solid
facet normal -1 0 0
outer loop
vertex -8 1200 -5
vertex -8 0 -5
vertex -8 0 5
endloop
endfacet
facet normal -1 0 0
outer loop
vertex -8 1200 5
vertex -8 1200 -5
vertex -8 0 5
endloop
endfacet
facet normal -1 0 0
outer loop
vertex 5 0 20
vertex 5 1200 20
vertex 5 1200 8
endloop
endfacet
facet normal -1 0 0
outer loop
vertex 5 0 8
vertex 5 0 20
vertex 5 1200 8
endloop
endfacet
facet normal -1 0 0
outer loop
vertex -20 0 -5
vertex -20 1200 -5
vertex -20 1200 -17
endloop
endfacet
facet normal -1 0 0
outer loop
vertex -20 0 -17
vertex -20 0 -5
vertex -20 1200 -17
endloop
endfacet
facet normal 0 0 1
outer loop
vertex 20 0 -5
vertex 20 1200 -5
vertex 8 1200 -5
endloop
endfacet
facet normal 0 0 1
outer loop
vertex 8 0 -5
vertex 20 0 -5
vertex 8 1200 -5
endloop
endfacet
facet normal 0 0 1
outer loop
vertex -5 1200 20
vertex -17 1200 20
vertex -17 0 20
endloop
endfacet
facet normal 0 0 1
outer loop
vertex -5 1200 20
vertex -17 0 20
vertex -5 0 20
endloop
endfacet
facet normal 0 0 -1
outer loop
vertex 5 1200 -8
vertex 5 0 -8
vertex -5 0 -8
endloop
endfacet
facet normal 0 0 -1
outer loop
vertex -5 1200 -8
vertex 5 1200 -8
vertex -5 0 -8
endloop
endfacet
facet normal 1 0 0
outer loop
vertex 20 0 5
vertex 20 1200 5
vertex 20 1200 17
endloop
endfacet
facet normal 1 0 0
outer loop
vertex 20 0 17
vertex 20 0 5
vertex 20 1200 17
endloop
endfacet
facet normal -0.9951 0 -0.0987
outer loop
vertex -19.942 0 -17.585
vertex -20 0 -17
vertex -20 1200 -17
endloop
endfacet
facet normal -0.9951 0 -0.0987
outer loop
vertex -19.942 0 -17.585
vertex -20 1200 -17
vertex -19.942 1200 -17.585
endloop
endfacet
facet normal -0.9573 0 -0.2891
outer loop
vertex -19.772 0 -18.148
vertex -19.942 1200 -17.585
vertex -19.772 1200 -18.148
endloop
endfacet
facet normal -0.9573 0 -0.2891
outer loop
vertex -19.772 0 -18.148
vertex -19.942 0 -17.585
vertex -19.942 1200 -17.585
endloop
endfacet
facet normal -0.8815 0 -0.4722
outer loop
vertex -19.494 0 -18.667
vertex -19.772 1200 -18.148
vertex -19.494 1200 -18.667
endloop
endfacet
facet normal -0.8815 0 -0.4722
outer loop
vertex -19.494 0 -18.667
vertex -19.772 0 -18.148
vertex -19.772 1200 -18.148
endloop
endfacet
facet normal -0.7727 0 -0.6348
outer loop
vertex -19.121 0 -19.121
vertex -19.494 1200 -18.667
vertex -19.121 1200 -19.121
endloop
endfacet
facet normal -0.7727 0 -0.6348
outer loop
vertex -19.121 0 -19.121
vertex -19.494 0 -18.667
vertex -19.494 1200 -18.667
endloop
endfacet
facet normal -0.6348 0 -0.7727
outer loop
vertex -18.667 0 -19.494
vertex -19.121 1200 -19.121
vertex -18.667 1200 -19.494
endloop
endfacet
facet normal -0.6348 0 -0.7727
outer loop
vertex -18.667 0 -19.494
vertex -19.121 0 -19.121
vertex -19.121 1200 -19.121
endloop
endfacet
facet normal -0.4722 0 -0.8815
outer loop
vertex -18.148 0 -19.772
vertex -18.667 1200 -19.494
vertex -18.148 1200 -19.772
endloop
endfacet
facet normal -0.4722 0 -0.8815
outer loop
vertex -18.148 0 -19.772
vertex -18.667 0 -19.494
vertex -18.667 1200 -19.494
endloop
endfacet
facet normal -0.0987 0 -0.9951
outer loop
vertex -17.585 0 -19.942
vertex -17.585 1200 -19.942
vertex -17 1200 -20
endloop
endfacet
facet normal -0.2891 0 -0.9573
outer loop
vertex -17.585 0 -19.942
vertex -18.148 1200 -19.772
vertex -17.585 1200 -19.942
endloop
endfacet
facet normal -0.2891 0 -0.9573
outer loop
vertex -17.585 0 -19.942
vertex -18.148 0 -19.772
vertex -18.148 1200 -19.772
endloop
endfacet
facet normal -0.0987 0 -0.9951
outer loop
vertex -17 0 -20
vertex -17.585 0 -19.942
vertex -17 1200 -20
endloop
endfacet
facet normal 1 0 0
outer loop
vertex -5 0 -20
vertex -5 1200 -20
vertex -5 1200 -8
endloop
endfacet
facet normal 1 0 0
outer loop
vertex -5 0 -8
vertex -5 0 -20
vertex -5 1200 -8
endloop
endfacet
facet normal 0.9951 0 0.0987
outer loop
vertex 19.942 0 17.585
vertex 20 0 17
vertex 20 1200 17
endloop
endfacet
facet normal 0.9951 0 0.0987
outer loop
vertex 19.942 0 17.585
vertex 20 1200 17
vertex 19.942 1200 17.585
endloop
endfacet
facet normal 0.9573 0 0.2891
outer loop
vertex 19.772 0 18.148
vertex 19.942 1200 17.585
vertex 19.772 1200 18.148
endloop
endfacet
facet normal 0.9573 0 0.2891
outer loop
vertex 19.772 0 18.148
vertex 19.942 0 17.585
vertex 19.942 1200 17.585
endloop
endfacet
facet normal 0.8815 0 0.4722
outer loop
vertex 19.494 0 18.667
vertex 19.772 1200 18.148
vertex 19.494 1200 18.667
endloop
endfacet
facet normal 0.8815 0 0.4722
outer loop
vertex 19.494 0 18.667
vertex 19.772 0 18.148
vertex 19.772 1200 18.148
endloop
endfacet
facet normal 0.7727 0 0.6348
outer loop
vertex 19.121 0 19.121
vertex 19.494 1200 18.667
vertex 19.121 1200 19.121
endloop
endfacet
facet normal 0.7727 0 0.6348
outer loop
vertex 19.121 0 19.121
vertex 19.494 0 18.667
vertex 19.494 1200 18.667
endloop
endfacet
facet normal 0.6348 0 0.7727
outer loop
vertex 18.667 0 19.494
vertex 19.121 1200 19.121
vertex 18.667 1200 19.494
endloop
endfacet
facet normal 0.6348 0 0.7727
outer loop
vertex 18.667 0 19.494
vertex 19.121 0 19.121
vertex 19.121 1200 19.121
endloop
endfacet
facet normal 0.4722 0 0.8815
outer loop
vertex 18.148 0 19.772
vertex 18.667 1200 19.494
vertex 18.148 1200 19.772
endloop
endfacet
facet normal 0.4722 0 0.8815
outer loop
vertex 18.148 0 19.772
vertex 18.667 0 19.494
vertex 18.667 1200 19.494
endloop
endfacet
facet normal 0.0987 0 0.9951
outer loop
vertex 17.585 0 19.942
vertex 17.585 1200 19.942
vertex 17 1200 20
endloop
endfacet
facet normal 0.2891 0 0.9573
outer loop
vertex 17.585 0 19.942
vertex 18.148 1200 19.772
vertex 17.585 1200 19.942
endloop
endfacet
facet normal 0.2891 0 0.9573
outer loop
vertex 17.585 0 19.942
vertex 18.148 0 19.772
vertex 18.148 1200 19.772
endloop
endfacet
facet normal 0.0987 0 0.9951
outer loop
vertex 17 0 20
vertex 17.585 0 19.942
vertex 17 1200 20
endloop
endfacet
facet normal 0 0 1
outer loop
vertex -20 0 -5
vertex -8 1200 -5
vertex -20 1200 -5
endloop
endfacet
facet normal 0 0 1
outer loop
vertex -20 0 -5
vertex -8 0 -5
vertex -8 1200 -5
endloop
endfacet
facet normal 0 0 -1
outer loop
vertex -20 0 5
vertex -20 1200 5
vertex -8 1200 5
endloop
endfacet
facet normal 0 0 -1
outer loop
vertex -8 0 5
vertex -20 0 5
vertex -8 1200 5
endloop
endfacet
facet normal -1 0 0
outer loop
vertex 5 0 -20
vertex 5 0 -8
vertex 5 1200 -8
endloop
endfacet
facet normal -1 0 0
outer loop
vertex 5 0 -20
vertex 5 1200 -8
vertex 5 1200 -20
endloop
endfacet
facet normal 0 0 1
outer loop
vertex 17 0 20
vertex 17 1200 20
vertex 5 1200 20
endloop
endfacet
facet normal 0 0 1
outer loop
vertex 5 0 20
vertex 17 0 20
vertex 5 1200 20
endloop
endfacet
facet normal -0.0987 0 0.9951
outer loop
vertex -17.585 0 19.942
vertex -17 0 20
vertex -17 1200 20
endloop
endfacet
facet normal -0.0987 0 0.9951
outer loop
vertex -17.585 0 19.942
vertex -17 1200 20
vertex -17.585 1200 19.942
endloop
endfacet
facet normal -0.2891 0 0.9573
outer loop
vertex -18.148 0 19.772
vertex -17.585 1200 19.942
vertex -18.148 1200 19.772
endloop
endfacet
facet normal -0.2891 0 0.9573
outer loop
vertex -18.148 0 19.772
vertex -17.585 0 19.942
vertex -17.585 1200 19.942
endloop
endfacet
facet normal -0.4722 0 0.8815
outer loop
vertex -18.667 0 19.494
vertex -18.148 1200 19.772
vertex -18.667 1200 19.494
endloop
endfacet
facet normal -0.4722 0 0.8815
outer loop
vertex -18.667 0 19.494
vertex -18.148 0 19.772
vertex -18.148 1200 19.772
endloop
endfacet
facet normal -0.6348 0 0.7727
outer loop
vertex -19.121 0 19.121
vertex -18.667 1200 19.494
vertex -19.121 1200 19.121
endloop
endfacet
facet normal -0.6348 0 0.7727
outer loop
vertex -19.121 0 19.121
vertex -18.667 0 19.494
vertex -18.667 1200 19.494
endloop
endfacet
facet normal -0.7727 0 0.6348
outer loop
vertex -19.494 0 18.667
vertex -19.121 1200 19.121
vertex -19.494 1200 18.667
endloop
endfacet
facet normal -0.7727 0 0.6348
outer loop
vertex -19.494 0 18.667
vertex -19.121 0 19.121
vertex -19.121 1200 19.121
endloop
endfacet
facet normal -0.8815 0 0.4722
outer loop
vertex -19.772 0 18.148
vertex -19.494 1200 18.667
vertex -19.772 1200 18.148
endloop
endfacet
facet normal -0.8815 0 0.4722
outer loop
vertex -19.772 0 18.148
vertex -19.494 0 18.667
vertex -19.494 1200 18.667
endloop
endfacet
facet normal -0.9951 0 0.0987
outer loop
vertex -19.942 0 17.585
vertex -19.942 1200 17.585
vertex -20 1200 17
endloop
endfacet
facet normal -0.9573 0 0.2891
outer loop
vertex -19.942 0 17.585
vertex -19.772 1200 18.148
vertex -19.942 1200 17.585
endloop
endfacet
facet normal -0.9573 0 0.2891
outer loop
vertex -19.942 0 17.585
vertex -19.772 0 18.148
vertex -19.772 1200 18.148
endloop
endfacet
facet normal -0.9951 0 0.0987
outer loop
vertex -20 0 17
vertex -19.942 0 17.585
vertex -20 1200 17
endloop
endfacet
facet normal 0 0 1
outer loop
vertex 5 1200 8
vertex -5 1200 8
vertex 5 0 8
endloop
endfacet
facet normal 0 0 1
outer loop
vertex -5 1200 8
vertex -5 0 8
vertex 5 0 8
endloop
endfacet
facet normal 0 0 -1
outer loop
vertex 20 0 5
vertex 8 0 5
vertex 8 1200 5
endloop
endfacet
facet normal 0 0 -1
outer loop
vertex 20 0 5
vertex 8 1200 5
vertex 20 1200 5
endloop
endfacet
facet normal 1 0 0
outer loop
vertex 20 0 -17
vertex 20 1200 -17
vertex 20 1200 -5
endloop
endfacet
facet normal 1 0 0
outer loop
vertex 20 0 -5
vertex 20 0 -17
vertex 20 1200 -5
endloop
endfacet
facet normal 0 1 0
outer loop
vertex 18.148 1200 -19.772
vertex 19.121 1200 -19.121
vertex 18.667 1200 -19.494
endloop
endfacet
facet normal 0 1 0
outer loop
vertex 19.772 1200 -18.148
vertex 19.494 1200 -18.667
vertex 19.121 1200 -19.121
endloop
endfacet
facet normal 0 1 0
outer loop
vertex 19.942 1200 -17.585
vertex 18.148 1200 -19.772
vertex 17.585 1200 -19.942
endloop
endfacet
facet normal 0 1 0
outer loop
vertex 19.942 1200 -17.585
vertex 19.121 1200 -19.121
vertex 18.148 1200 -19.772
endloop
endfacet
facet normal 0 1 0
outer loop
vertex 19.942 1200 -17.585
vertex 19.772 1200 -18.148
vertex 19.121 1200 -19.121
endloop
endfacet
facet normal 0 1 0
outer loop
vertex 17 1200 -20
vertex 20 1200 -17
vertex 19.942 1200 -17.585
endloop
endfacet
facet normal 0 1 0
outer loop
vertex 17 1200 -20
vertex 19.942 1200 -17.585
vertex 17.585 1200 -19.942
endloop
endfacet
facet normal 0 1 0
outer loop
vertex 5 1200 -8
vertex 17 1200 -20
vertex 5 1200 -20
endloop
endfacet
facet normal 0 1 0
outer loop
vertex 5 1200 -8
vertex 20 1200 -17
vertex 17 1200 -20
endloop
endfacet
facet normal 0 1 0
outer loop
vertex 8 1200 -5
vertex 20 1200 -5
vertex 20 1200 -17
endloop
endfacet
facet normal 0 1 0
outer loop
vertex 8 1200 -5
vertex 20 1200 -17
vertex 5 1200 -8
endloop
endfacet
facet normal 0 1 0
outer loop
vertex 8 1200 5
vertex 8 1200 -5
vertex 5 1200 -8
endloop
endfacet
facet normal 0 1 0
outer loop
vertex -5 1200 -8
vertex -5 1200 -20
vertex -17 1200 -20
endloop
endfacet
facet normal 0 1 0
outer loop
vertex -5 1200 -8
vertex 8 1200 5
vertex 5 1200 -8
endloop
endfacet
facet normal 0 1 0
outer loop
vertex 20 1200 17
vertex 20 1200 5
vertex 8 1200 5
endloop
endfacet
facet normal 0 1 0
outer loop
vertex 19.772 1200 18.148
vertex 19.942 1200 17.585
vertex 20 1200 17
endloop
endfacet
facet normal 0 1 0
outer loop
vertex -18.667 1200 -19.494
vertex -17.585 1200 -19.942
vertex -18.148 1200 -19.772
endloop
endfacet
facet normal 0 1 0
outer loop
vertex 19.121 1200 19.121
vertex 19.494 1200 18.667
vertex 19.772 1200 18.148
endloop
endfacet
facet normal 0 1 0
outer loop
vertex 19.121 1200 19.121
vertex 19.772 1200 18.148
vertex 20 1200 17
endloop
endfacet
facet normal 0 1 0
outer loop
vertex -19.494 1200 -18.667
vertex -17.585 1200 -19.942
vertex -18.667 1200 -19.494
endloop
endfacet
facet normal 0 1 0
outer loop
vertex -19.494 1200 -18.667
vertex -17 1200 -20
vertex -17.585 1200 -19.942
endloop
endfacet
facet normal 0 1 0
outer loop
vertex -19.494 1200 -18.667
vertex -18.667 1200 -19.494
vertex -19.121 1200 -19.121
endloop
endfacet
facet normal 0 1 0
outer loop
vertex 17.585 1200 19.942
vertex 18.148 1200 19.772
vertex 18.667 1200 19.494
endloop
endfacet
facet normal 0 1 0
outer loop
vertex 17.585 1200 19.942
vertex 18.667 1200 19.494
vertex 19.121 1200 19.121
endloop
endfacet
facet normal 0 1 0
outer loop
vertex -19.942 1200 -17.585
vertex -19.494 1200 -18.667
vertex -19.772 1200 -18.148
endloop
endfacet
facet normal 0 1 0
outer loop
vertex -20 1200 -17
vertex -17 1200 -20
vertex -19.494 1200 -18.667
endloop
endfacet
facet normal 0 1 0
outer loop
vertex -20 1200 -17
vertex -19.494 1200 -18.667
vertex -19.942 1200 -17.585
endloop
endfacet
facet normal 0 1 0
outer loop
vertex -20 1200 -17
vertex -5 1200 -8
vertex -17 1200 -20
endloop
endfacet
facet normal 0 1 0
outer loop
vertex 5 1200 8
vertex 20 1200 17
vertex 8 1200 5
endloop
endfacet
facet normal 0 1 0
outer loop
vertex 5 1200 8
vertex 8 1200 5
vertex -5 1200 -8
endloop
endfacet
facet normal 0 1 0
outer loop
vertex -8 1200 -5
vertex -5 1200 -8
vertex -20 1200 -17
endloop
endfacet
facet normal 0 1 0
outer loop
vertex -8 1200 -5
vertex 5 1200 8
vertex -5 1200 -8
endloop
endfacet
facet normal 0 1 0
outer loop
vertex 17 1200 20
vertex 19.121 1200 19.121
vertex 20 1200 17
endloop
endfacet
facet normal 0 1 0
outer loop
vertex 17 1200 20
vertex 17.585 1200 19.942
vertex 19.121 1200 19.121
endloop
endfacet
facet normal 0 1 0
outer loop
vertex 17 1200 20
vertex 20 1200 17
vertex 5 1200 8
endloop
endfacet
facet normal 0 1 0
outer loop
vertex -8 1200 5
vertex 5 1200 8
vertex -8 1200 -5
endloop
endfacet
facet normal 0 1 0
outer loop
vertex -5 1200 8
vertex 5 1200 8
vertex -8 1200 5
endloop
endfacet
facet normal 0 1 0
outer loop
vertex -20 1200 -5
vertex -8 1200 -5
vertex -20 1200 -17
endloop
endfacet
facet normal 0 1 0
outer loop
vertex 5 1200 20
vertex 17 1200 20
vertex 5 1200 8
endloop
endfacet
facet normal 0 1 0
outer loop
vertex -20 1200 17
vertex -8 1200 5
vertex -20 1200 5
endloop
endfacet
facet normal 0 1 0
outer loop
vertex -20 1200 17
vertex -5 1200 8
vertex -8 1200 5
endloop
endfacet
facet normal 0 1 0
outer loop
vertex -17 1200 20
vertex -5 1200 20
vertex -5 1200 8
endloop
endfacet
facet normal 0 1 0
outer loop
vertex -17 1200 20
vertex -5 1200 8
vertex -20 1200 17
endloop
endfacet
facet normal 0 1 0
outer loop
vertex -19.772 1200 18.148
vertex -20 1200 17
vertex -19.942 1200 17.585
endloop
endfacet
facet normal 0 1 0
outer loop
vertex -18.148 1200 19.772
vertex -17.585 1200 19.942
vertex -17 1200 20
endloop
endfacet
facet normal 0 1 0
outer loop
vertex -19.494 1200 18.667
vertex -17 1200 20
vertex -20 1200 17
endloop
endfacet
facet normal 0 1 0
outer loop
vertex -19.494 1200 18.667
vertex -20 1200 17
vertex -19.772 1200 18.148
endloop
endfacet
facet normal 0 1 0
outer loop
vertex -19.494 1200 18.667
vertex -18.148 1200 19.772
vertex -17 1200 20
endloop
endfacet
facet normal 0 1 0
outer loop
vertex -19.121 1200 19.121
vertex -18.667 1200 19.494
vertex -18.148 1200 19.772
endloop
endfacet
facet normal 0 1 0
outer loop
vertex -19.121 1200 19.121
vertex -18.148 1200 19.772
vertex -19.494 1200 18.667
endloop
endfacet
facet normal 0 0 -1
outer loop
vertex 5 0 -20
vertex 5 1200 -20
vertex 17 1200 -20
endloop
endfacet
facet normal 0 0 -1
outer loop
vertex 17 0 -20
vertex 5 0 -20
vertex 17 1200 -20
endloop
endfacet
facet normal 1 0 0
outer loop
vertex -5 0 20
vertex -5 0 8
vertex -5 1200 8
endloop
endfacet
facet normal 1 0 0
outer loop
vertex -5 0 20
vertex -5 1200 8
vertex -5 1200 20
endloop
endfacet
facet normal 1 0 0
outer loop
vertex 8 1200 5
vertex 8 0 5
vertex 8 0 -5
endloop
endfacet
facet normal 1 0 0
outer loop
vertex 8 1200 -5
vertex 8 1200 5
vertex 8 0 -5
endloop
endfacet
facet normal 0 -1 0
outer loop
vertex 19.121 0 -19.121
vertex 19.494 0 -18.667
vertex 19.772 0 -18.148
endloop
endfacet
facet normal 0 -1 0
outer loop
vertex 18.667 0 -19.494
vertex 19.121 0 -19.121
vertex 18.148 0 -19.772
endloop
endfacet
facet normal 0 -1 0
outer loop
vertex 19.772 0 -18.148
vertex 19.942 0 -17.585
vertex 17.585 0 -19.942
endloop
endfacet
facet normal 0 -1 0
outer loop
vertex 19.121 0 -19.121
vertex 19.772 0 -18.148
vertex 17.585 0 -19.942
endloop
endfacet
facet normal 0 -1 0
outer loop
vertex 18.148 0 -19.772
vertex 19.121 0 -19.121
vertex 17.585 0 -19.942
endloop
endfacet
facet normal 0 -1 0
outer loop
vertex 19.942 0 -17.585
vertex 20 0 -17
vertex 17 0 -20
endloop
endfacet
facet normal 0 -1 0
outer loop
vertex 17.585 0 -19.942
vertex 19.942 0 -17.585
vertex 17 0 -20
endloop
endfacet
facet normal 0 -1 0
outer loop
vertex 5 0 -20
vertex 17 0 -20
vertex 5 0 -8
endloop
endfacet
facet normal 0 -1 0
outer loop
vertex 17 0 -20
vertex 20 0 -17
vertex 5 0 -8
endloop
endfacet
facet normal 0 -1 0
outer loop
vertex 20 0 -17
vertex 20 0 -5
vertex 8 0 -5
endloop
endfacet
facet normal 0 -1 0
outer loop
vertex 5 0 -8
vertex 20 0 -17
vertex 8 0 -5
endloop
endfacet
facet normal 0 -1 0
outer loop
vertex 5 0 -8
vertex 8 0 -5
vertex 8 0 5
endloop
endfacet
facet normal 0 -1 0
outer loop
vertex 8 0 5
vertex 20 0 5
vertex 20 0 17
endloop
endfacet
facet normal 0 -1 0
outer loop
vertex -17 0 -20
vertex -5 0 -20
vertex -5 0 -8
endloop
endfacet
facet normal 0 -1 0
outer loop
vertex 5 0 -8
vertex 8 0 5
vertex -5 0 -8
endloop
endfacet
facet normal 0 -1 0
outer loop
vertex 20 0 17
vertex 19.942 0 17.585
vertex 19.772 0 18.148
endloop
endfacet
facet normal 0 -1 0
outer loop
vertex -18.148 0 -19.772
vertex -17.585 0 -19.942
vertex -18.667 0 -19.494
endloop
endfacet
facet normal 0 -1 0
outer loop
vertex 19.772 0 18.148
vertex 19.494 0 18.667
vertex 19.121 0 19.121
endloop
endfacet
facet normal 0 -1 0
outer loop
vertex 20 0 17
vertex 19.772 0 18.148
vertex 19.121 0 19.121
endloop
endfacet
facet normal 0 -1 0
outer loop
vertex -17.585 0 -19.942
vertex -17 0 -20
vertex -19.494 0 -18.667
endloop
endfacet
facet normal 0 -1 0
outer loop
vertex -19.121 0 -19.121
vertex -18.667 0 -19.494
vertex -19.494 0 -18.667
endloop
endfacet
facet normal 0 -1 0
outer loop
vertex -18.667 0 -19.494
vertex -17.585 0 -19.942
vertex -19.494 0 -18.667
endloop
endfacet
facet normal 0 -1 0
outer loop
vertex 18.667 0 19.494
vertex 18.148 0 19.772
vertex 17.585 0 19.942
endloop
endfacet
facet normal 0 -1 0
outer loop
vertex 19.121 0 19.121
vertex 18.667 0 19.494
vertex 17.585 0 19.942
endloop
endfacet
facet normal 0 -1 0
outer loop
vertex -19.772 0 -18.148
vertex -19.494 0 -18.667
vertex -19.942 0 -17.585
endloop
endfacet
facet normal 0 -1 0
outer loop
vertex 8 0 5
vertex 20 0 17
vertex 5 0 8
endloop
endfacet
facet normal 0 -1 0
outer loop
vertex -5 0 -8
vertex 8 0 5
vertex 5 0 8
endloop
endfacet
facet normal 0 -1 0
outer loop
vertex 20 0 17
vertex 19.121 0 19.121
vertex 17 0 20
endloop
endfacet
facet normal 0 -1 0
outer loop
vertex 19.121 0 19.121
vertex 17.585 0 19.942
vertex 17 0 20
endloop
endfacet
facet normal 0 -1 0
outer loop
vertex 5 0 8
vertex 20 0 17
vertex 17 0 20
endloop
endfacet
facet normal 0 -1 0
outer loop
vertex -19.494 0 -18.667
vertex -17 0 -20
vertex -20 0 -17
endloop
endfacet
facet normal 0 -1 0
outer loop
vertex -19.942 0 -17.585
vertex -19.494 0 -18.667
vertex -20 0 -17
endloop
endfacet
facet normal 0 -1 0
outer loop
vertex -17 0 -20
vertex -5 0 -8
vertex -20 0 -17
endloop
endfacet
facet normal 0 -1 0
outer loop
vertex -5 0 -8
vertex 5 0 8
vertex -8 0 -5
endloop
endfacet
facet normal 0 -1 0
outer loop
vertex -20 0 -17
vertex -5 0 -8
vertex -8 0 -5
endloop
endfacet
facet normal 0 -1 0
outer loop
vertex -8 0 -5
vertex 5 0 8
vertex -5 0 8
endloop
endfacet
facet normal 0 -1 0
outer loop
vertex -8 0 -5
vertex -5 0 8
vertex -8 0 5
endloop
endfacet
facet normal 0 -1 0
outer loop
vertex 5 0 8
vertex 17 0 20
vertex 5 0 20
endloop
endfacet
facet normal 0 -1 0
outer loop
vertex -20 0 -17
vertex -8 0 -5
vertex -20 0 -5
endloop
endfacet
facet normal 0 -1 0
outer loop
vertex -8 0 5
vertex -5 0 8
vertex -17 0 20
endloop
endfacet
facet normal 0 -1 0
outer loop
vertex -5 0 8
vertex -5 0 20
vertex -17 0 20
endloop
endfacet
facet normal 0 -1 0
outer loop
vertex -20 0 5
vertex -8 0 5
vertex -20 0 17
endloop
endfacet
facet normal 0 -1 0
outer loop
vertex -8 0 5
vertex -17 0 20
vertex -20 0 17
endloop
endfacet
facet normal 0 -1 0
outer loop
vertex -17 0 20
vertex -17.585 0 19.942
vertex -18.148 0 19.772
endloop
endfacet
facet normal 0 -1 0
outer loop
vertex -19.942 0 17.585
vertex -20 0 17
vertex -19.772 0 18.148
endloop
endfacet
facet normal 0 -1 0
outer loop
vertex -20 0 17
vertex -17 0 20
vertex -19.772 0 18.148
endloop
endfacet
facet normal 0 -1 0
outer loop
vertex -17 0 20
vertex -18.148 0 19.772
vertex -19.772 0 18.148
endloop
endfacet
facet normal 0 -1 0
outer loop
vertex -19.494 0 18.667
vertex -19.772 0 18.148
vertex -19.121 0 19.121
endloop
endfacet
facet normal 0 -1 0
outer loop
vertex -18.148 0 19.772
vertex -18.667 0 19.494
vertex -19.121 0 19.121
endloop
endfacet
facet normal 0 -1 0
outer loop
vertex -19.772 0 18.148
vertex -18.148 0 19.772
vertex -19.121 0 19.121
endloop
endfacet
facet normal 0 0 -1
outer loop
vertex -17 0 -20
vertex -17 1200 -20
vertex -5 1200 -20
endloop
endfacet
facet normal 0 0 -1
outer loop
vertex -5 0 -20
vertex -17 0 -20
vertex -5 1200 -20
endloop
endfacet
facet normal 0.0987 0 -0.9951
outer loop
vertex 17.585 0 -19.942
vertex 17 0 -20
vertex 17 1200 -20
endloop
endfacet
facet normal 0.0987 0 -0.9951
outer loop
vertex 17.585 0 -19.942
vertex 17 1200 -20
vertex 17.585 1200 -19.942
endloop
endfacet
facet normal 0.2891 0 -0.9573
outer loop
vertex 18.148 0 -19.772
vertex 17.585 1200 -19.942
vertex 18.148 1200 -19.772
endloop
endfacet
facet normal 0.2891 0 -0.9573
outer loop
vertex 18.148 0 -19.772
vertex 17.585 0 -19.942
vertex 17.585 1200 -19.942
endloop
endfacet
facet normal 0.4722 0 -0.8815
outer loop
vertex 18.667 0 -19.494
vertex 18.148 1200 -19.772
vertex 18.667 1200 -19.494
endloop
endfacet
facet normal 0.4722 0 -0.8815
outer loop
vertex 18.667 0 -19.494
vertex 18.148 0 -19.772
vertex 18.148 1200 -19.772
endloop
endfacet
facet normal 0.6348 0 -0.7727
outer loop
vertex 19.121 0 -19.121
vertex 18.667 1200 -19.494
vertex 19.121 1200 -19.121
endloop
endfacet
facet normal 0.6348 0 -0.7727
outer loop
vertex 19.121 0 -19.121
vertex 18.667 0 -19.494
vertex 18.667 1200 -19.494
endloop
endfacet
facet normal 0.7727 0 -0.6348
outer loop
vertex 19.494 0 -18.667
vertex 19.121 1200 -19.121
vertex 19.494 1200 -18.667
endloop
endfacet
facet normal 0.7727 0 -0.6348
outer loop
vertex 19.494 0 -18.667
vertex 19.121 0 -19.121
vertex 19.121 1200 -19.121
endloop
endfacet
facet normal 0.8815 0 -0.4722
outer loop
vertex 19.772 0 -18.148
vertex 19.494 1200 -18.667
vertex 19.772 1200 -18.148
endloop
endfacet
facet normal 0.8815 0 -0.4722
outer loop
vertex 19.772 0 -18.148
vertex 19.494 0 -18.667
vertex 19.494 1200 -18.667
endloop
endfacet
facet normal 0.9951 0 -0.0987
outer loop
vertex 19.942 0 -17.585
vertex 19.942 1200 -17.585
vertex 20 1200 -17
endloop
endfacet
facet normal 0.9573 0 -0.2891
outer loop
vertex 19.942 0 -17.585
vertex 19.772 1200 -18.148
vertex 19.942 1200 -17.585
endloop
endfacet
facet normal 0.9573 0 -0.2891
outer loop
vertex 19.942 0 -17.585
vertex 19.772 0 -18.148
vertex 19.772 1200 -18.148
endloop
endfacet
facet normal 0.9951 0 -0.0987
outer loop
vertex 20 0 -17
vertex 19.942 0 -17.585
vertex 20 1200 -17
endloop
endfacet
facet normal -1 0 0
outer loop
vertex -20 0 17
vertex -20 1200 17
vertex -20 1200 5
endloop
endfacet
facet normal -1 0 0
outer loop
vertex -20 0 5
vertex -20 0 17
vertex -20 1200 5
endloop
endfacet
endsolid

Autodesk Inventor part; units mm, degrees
ref_plane "YZ Plane" through (0, 0, 0) normal (1, 0, 0) x (0, 1, 0)
ref_plane "XZ Plane" through (0, 0, 0) normal (0, 1, 0) x (-1, 0, 0)
ref_plane "XY Plane" through (0, 0, 0) normal (0, 0, 1) x (1, 0, 0)
sketch "Sketch1" plane through (0, 0, 0) normal (0, 1, 0) x (-1, 0, 0)
  line L0 (-5, 20) -> (-5, 8)
  line L1 (5, -20) -> (5, -8)
  line L2 (20, 5) -> (8, 5)
  line L3 (-20, -5) -> (-8, -5)
  line L4 (8, -5) -> (20, -5)
  line L5 (-8, 5) -> (-20, 5)
  line L6 (-5, -8) -> (-5, -20)
  line L7 (5, 8) -> (5, 20)
  arc A0 (-17, 20) -> (-20, 17) centre (-17, 17) ccw
  arc A1 (-20, -17) -> (-17, -20) centre (-17, -17) ccw
  arc A2 (17, -20) -> (20, -17) centre (17, -17) ccw
  arc A3 (20, 17) -> (17, 20) centre (17, 17) ccw
  line L8 (20, 17) -> (20, 5)
  line L9 (20, -5) -> (20, -17)
  line L10 (17, -20) -> (5, -20)
  line L11 (-5, -20) -> (-17, -20)
  line L12 (-20, -17) -> (-20, -5)
  line L13 (-20, 5) -> (-20, 17)
  line L14 (-17, 20) -> (-5, 20)
  line L15 (17, 20) -> (5, 20)
  line L16 (5, 8) -> (-5, 8)
  line L17 (-8, 5) -> (-8, -5)
  line L18 (-5, -8) -> (5, -8)
  line L19 (8, -5) -> (8, 5)
  point P0 (0, 0)
extrude "Extrusion1" add sketch "Sketch1" along normal blind 1200
properties part number "column"
